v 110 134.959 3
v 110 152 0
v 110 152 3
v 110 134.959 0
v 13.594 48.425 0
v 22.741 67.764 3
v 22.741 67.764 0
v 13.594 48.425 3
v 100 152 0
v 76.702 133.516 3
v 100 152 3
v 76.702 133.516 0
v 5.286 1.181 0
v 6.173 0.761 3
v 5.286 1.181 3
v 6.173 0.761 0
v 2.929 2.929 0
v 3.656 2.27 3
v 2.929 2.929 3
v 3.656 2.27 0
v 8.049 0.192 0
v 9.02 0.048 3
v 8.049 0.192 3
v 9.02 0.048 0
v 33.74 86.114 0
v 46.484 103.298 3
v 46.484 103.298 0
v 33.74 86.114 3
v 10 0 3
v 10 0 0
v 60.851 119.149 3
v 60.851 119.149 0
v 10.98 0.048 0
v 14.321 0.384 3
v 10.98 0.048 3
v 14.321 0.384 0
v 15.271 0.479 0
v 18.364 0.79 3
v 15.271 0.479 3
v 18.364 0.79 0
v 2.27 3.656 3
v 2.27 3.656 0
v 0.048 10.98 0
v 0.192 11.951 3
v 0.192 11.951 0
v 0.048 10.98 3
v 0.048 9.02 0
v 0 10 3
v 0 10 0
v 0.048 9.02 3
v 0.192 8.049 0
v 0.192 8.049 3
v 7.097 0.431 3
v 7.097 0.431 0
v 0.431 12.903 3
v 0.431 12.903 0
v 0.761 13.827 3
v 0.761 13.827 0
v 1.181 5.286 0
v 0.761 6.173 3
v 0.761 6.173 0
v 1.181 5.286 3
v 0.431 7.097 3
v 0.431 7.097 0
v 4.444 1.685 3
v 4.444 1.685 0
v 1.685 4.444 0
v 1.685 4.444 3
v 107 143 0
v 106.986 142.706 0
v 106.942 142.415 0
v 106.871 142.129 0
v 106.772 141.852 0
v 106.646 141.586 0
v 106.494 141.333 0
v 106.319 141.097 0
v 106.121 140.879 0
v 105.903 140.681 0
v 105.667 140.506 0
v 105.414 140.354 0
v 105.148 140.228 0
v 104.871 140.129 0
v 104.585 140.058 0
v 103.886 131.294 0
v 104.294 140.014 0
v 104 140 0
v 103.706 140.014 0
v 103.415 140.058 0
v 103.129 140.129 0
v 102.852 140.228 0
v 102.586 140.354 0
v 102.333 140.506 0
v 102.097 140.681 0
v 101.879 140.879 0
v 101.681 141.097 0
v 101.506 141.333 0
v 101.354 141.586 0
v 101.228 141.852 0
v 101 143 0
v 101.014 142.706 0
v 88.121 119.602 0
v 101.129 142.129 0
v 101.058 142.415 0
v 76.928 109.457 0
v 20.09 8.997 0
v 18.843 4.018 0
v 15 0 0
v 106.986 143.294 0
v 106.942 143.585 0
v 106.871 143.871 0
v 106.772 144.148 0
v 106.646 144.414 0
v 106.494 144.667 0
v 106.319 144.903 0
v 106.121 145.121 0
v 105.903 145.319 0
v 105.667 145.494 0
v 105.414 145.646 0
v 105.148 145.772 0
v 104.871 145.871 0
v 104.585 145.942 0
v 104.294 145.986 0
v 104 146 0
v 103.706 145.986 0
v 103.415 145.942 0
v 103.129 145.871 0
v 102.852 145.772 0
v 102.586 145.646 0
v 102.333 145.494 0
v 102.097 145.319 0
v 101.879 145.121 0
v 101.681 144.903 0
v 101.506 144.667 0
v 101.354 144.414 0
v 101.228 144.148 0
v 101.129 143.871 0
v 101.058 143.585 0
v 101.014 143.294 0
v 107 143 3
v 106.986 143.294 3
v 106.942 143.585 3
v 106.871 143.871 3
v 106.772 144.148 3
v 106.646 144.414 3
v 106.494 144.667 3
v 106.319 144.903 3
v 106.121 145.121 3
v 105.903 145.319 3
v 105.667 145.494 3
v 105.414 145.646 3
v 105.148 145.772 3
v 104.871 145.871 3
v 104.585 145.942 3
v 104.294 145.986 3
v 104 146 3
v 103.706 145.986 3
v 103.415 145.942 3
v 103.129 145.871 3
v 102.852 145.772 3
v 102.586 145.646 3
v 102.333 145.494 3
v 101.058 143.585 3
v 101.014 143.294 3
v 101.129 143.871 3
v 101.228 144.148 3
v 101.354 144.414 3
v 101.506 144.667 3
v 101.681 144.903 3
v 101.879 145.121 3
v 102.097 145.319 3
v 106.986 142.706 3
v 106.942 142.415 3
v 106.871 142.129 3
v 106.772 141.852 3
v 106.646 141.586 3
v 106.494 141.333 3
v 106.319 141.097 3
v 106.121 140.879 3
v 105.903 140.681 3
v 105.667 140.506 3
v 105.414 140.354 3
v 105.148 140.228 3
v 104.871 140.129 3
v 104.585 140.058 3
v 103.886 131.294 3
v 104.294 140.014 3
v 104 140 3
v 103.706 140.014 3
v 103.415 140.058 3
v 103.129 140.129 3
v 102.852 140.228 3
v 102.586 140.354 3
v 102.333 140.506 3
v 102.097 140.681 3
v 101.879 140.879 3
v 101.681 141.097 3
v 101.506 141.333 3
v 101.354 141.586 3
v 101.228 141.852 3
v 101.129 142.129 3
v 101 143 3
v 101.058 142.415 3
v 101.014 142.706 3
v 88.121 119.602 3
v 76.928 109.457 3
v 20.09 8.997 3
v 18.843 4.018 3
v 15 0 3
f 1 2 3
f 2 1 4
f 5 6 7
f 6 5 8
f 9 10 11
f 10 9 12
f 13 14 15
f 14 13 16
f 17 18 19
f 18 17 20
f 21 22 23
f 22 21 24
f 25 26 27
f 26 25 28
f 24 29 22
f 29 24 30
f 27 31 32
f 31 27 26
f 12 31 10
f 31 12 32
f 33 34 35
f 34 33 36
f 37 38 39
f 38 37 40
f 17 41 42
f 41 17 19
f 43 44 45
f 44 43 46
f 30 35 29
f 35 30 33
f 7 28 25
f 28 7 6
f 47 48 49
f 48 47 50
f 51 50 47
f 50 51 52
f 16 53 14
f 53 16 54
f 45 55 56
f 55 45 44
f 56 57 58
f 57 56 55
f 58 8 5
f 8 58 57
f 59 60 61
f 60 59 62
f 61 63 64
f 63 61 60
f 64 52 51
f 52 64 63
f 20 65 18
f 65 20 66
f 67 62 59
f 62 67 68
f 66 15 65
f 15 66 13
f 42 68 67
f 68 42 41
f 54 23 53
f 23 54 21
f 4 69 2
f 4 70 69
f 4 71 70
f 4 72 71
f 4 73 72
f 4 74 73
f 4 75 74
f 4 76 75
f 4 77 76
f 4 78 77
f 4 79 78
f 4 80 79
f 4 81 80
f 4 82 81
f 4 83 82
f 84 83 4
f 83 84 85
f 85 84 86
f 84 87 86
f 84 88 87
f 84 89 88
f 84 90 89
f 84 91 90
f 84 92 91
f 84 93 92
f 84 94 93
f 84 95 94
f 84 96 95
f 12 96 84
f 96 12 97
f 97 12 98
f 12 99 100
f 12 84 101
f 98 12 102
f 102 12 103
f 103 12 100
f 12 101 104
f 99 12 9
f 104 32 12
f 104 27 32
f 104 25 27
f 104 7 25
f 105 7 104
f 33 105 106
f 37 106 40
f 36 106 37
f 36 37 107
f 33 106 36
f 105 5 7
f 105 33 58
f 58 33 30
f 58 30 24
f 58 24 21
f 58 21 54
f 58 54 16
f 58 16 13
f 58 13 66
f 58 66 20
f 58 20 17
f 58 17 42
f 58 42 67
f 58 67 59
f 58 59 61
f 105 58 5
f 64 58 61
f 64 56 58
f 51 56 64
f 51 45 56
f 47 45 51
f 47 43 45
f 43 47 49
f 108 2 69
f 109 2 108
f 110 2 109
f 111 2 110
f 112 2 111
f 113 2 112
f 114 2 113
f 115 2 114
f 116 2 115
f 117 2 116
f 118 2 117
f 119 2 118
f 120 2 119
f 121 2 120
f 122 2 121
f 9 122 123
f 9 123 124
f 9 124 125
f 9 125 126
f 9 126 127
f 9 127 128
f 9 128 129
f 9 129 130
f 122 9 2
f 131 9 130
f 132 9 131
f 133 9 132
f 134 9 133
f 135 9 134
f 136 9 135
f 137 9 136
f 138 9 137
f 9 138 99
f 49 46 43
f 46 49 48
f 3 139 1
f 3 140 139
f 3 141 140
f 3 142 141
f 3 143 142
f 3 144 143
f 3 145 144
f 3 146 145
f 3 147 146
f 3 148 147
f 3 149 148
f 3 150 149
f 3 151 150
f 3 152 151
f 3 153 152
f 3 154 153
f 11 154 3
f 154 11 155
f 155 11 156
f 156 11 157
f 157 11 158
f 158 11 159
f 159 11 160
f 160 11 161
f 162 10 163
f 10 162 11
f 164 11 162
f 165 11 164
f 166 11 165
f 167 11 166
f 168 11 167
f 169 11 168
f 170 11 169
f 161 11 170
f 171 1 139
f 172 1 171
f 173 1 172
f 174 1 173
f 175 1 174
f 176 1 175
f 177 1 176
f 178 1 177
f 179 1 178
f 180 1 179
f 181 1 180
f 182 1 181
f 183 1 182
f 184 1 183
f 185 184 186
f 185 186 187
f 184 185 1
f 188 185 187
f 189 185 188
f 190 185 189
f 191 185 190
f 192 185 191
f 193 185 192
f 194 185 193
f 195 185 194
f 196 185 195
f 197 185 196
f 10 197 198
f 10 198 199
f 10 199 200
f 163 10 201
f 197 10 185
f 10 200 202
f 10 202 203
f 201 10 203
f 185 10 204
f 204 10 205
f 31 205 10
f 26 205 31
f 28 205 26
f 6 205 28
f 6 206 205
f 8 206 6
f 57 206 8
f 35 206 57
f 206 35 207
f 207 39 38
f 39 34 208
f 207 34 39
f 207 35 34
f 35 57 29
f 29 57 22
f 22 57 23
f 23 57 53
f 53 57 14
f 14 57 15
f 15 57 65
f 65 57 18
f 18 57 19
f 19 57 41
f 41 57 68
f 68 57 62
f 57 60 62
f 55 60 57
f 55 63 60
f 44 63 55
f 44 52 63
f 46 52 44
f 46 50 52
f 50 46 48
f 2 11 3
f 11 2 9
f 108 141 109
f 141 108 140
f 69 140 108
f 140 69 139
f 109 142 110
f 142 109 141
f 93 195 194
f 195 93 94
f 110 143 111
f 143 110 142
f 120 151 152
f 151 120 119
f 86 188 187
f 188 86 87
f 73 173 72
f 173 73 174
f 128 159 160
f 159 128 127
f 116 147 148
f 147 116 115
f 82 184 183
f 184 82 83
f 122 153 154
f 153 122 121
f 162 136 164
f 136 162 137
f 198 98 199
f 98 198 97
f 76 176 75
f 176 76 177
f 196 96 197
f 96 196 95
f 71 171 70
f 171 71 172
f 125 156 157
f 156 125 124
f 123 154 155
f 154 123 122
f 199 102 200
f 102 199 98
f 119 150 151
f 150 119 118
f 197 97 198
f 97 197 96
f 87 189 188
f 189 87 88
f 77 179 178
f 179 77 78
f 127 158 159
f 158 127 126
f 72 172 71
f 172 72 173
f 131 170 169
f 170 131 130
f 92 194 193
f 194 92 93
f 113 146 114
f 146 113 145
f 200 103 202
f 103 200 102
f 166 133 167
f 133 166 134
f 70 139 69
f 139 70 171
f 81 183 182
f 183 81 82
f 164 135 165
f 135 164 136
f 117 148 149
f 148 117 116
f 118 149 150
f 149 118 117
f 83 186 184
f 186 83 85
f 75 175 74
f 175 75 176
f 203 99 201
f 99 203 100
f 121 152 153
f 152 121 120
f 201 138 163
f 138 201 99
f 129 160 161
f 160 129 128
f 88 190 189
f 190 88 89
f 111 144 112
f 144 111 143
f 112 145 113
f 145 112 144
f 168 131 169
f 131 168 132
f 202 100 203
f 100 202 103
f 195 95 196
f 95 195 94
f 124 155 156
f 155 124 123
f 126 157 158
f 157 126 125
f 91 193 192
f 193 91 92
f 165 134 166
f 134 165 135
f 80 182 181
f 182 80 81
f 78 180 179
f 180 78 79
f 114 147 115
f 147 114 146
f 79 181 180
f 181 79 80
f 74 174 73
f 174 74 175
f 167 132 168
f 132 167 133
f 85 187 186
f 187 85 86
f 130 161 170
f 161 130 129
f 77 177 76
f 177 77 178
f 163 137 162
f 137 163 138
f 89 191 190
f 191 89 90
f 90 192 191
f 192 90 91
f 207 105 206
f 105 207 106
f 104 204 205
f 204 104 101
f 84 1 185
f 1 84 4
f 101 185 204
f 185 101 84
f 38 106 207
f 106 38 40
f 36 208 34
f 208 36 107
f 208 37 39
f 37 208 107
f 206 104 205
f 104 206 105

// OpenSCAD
// hub is radius of 27, centered on 0,0,xy plane
// get license and attribute or replace with self
// design

$fn=64;
module basic_fin() {
    translate([75,0,0]) {
        rotate([0,180,0]) {
            import("fin2.stl", convexity=3);
        }
    }
}

module basic_fin2() {
    union() {
        difference() {
            hull() {
                union() {  
                    translate([100,140,0]) {
                        cube([10,12,3]);
                    }
                    difference() {
                        translate([215,-35,0]) {
                            cylinder(r=218, h=3);
                        } 
                        translate([110, -500, -1]) {
                            cube([400, 1500, 5]);
                        }
                        translate([-40, -300, -1]) {
                            cube([200, 310, 5]);
                        }
                    }
                    translate([10,10,0]) {
                        cylinder(r=10, h=3);
                    }
                }
            }
            translate([95,152,-1]) {
                cube([20,20,5]);
            } 
            translate([104,143,-2]) {
                cylinder(r=3, h=25);
            } 
            
            translate([215,-35,-1]) {
                cylinder(r=200, h=5);
            }    
        }
        translate([15,0,0]) {
            rotate([0,0,60.5]) {
                cube([130,10,3]);
            }
        }
    }
    
}



module make_model() {
//    translate([29,57,0]) {
//        basic_fin();
//    }
    basic_fin2();
}


$flat_for_svg = 0;

if ($flat_for_svg) {
    projection(cut=true) {
        translate([0,0,0]) rotate([0,0,0]) {
            make_model();
        }
    }
} else {
    make_model();
}
